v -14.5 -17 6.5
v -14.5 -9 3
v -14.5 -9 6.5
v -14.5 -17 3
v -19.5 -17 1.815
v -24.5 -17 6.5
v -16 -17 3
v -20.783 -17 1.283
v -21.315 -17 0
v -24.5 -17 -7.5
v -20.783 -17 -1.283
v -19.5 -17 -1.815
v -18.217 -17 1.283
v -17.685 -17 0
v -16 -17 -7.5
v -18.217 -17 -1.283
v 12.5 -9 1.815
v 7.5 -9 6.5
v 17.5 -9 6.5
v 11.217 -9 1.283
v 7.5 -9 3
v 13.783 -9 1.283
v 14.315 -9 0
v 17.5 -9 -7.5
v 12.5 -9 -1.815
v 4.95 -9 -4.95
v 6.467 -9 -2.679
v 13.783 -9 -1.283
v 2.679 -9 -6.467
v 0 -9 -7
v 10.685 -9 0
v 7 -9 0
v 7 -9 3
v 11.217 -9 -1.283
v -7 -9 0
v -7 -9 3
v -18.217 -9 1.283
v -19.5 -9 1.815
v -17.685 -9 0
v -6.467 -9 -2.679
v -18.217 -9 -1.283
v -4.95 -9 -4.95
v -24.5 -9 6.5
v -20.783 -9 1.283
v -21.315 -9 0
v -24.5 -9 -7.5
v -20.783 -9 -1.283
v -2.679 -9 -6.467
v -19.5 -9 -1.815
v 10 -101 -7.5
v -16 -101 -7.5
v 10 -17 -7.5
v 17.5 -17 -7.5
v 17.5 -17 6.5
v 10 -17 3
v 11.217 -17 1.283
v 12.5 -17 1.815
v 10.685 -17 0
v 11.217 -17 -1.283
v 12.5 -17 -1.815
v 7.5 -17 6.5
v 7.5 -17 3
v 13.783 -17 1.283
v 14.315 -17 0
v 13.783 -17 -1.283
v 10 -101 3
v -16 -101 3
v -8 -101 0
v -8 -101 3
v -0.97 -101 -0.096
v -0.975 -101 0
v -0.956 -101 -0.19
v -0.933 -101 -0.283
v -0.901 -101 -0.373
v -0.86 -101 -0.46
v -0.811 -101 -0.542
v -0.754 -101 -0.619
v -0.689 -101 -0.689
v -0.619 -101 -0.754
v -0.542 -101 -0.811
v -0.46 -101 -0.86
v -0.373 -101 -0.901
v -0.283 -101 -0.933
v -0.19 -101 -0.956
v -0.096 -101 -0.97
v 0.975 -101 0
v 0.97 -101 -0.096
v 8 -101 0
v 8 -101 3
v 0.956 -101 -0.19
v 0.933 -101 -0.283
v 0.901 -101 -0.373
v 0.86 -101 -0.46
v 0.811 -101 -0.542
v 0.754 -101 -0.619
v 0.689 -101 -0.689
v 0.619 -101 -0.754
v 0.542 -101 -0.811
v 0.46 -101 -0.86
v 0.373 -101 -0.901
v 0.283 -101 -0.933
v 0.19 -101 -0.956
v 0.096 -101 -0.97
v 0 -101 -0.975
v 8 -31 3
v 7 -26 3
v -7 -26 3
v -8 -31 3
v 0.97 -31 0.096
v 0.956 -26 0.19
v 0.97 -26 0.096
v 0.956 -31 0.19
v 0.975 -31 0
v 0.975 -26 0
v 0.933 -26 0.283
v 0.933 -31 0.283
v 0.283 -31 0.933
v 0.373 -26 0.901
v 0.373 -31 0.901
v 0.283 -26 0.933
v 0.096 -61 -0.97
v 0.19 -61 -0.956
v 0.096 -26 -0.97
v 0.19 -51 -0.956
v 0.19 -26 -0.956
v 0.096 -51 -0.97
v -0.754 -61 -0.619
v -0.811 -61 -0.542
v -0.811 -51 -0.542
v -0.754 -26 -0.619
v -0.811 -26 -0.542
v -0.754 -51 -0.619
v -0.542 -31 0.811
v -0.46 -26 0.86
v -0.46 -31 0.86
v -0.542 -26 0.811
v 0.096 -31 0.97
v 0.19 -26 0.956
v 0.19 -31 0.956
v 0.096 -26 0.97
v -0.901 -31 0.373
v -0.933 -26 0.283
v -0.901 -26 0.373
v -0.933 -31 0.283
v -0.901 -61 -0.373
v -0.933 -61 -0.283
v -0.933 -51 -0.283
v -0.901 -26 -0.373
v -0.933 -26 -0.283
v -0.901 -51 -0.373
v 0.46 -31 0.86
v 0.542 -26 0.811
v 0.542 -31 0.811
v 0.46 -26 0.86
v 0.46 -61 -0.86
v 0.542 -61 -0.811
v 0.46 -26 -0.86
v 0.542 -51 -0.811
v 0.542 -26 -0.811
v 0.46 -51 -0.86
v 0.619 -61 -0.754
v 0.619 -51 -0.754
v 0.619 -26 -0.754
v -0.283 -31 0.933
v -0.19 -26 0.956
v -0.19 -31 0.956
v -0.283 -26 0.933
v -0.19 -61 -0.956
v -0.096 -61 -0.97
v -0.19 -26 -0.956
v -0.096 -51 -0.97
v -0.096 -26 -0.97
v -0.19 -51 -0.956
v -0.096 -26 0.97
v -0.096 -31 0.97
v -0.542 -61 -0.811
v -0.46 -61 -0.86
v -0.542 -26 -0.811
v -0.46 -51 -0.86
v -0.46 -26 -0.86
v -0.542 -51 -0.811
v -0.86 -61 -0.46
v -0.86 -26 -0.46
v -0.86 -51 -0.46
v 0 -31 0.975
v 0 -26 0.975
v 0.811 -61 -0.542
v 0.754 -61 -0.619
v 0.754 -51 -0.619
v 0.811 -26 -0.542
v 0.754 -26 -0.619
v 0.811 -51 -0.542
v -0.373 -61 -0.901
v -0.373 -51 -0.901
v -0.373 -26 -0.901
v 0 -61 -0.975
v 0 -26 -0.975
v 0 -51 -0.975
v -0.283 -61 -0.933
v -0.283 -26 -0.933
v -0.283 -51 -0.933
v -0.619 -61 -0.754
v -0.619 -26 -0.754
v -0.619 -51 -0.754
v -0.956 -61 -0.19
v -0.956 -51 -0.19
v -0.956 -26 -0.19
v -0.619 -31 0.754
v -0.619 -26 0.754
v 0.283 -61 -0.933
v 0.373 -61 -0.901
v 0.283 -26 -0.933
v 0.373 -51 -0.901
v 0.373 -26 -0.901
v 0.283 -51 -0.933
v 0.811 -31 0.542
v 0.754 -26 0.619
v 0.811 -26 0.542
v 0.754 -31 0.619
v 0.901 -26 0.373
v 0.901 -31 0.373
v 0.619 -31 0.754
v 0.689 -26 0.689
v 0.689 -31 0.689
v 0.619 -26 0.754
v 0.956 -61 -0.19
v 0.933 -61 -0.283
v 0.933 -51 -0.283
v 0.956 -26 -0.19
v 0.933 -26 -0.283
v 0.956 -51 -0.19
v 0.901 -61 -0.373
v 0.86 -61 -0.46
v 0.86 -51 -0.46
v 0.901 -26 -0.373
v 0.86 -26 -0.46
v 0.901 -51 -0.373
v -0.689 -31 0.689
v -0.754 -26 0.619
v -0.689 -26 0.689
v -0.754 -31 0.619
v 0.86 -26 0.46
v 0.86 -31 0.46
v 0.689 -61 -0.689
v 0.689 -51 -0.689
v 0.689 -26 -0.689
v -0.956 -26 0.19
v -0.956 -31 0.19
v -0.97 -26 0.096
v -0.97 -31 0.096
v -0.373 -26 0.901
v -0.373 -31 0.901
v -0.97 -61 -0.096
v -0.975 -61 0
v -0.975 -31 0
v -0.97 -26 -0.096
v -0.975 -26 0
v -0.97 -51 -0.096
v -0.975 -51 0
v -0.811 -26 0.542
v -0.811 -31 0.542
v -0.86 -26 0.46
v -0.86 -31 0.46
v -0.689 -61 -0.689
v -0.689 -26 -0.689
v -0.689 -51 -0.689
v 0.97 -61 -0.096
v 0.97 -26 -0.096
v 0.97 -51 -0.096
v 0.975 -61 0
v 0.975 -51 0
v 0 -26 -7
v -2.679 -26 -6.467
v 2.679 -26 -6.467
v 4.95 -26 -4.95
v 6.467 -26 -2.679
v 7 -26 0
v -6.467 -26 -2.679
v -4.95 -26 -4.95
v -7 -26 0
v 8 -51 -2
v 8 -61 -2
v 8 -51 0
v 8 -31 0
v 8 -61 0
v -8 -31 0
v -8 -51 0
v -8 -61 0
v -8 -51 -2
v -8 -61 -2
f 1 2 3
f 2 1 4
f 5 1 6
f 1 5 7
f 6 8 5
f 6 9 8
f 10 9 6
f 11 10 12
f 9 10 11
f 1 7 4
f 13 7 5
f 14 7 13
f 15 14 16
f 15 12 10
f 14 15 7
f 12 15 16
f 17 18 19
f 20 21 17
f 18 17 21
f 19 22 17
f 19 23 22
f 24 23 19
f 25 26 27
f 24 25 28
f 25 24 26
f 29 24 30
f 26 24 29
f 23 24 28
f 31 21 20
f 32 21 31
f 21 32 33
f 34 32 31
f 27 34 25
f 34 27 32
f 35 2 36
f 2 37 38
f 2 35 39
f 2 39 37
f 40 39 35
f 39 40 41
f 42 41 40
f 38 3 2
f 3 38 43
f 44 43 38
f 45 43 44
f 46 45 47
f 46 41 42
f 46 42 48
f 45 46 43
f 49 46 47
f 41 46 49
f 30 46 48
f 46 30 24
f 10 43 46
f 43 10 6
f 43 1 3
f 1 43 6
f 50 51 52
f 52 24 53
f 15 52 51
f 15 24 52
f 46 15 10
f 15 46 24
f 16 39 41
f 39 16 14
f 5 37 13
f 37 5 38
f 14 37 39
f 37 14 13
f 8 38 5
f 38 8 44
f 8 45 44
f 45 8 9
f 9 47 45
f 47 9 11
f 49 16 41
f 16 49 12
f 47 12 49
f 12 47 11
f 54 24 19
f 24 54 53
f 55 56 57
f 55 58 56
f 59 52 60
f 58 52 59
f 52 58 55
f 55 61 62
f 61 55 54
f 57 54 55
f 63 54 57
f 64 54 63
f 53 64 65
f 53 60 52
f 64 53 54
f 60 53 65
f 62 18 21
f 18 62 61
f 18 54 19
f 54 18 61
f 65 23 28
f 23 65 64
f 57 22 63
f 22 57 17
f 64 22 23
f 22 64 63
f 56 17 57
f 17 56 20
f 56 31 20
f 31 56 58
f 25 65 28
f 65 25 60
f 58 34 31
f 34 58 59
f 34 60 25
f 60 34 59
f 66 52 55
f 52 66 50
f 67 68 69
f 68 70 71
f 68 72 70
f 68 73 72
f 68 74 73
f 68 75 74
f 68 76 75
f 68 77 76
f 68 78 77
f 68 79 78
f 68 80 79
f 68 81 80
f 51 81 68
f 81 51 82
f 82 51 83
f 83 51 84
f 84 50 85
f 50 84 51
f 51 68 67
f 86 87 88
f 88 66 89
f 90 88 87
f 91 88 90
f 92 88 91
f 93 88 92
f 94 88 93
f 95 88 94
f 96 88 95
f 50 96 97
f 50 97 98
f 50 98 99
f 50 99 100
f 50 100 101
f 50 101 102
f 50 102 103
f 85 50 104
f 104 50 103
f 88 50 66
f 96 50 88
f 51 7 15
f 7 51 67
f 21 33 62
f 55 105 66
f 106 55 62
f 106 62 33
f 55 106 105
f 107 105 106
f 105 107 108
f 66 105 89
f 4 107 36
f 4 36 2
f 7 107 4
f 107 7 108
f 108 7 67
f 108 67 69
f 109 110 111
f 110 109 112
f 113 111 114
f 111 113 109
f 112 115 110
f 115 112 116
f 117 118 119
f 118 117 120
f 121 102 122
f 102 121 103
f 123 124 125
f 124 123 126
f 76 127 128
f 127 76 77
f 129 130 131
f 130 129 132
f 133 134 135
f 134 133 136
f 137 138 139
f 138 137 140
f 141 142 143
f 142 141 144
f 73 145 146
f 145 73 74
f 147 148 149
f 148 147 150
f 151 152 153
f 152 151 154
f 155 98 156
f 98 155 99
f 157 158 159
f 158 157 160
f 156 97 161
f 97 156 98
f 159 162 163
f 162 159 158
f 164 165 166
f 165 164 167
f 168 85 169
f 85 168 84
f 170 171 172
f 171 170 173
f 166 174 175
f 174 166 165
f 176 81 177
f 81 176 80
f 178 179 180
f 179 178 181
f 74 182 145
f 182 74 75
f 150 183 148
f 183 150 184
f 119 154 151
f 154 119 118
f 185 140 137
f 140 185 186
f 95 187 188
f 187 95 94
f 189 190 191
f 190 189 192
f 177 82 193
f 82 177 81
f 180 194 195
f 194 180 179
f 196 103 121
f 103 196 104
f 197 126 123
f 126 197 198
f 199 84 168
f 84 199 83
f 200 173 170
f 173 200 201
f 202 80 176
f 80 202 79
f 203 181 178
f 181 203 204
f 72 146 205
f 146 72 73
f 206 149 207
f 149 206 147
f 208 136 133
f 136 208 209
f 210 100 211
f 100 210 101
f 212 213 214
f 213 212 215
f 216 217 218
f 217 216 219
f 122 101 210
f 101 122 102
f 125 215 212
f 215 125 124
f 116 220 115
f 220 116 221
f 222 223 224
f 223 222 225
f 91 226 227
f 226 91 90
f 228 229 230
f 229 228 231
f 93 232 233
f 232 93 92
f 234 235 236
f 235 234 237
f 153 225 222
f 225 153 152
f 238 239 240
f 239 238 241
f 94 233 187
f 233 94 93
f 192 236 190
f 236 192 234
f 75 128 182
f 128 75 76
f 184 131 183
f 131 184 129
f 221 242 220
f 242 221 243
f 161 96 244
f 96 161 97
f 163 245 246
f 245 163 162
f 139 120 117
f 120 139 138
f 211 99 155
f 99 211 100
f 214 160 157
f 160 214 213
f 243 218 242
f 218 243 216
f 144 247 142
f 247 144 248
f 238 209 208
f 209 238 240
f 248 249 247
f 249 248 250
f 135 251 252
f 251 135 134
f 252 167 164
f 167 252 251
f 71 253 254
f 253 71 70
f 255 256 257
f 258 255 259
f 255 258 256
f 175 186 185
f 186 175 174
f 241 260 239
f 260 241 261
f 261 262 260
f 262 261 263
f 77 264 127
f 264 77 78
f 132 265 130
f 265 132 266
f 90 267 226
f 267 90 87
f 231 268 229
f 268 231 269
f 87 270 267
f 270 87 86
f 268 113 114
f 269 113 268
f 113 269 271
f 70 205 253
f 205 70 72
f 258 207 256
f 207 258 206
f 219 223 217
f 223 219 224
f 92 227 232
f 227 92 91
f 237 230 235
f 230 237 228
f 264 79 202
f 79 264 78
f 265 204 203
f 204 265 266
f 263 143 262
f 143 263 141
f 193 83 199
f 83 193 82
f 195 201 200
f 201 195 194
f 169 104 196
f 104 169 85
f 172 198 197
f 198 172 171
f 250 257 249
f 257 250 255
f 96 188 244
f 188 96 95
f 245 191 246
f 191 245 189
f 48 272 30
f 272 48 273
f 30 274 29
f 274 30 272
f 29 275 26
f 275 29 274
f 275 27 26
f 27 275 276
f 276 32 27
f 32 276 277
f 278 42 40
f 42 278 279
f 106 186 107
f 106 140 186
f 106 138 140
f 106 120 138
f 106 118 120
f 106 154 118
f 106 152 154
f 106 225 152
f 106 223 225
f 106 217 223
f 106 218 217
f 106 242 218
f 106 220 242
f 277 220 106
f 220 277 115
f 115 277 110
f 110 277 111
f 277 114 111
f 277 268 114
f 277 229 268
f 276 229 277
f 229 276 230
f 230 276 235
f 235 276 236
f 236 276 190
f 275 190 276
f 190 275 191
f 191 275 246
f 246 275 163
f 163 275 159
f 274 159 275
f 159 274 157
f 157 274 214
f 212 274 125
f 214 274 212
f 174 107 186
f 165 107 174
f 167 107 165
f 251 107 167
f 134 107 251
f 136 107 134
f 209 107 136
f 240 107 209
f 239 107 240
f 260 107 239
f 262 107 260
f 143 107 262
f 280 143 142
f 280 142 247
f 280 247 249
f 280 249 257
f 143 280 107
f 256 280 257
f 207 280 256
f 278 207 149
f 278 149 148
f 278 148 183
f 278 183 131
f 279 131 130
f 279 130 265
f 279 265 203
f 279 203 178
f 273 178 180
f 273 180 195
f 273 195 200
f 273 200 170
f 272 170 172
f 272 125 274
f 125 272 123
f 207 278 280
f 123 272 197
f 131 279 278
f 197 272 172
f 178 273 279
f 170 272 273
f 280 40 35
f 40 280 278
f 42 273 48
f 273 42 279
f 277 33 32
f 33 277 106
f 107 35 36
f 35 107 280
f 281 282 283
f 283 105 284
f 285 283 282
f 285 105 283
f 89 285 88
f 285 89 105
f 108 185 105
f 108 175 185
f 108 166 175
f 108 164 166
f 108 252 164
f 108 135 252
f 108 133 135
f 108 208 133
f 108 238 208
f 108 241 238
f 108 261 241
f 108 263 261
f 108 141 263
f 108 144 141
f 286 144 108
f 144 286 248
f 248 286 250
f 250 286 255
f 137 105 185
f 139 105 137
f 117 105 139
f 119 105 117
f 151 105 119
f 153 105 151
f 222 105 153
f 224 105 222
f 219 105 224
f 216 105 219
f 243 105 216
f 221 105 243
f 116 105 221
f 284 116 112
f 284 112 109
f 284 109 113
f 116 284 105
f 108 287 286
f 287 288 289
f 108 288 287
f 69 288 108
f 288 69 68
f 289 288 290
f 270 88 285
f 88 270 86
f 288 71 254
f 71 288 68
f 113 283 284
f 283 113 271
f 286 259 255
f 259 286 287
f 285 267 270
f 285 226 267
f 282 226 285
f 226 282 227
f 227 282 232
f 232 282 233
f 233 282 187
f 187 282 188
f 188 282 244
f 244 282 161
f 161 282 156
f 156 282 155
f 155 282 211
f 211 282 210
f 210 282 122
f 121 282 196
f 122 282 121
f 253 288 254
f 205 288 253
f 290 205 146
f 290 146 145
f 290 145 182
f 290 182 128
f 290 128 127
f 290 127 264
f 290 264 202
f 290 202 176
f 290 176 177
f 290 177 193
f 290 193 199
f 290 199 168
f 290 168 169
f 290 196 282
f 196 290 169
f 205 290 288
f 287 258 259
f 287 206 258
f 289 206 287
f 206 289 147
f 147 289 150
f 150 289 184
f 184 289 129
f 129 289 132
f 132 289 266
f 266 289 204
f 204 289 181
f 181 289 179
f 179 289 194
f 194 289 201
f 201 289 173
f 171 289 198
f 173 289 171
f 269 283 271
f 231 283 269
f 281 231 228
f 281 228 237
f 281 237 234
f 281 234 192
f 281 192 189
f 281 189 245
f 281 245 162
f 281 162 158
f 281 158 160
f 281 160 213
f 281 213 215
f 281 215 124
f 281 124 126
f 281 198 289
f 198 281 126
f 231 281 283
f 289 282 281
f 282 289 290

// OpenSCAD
/* [Filament] */

//Filament Diameter
filament_dia=1.75+0.2;

/* [Mounting Holes] */

//Mount Hole Diameter
mount_hole_dia=3.63;
mount_hole_offset_left=19.5;
mount_hole_offset_right=12.5;
mounting_block_left_width=10;
mounting_block_right_width=10;

/* [Caliper Area Settings] */
measurable_length=20;
caliper_rest_length=50;
filament_guide_length=5;
bowden_coupler_length=17;

rotate([90,0,0]){
	difference(){
		translate([-mount_hole_offset_left-(mounting_block_left_width/2),-7.5,9])cube([mounting_block_left_width,14,8]);
		color("red")translate([-mount_hole_offset_left,0,0])cylinder(d=mount_hole_dia,h=30,$fn=8);
	}
	difference(){
		translate([mount_hole_offset_right-(mounting_block_right_width/2),-7.5,9])cube([mounting_block_right_width,14,8]);
		color("red")translate([mount_hole_offset_right,0,0])cylinder(d=mount_hole_dia,h=30,$fn=8);
	}
	difference(){
		color("orange")translate([-16,-7.5,9])cube([26,7.5+3,14+8+measurable_length+caliper_rest_length]);//Base
		color("blue")translate([0,0,9])cylinder(d=filament_dia,h=14+8+measurable_length+caliper_rest_length,$fn=64);//Filament
		color("blue")cylinder(d=14,h=9+bowden_coupler_length,$fn=16);//bowden coupler
		color("green")translate([-7,0,0])cube([14,14,9+bowden_coupler_length]);
		color("black")translate([-(16/2),0,9+bowden_coupler_length+filament_guide_length])cube([16,3,measurable_length+caliper_rest_length]);//Caliper Slot
		color("red")translate([-(16/2),-2,9+bowden_coupler_length+filament_guide_length+measurable_length])cube([16,5,10]);//Caliper Slot Lower bit
		}
}
